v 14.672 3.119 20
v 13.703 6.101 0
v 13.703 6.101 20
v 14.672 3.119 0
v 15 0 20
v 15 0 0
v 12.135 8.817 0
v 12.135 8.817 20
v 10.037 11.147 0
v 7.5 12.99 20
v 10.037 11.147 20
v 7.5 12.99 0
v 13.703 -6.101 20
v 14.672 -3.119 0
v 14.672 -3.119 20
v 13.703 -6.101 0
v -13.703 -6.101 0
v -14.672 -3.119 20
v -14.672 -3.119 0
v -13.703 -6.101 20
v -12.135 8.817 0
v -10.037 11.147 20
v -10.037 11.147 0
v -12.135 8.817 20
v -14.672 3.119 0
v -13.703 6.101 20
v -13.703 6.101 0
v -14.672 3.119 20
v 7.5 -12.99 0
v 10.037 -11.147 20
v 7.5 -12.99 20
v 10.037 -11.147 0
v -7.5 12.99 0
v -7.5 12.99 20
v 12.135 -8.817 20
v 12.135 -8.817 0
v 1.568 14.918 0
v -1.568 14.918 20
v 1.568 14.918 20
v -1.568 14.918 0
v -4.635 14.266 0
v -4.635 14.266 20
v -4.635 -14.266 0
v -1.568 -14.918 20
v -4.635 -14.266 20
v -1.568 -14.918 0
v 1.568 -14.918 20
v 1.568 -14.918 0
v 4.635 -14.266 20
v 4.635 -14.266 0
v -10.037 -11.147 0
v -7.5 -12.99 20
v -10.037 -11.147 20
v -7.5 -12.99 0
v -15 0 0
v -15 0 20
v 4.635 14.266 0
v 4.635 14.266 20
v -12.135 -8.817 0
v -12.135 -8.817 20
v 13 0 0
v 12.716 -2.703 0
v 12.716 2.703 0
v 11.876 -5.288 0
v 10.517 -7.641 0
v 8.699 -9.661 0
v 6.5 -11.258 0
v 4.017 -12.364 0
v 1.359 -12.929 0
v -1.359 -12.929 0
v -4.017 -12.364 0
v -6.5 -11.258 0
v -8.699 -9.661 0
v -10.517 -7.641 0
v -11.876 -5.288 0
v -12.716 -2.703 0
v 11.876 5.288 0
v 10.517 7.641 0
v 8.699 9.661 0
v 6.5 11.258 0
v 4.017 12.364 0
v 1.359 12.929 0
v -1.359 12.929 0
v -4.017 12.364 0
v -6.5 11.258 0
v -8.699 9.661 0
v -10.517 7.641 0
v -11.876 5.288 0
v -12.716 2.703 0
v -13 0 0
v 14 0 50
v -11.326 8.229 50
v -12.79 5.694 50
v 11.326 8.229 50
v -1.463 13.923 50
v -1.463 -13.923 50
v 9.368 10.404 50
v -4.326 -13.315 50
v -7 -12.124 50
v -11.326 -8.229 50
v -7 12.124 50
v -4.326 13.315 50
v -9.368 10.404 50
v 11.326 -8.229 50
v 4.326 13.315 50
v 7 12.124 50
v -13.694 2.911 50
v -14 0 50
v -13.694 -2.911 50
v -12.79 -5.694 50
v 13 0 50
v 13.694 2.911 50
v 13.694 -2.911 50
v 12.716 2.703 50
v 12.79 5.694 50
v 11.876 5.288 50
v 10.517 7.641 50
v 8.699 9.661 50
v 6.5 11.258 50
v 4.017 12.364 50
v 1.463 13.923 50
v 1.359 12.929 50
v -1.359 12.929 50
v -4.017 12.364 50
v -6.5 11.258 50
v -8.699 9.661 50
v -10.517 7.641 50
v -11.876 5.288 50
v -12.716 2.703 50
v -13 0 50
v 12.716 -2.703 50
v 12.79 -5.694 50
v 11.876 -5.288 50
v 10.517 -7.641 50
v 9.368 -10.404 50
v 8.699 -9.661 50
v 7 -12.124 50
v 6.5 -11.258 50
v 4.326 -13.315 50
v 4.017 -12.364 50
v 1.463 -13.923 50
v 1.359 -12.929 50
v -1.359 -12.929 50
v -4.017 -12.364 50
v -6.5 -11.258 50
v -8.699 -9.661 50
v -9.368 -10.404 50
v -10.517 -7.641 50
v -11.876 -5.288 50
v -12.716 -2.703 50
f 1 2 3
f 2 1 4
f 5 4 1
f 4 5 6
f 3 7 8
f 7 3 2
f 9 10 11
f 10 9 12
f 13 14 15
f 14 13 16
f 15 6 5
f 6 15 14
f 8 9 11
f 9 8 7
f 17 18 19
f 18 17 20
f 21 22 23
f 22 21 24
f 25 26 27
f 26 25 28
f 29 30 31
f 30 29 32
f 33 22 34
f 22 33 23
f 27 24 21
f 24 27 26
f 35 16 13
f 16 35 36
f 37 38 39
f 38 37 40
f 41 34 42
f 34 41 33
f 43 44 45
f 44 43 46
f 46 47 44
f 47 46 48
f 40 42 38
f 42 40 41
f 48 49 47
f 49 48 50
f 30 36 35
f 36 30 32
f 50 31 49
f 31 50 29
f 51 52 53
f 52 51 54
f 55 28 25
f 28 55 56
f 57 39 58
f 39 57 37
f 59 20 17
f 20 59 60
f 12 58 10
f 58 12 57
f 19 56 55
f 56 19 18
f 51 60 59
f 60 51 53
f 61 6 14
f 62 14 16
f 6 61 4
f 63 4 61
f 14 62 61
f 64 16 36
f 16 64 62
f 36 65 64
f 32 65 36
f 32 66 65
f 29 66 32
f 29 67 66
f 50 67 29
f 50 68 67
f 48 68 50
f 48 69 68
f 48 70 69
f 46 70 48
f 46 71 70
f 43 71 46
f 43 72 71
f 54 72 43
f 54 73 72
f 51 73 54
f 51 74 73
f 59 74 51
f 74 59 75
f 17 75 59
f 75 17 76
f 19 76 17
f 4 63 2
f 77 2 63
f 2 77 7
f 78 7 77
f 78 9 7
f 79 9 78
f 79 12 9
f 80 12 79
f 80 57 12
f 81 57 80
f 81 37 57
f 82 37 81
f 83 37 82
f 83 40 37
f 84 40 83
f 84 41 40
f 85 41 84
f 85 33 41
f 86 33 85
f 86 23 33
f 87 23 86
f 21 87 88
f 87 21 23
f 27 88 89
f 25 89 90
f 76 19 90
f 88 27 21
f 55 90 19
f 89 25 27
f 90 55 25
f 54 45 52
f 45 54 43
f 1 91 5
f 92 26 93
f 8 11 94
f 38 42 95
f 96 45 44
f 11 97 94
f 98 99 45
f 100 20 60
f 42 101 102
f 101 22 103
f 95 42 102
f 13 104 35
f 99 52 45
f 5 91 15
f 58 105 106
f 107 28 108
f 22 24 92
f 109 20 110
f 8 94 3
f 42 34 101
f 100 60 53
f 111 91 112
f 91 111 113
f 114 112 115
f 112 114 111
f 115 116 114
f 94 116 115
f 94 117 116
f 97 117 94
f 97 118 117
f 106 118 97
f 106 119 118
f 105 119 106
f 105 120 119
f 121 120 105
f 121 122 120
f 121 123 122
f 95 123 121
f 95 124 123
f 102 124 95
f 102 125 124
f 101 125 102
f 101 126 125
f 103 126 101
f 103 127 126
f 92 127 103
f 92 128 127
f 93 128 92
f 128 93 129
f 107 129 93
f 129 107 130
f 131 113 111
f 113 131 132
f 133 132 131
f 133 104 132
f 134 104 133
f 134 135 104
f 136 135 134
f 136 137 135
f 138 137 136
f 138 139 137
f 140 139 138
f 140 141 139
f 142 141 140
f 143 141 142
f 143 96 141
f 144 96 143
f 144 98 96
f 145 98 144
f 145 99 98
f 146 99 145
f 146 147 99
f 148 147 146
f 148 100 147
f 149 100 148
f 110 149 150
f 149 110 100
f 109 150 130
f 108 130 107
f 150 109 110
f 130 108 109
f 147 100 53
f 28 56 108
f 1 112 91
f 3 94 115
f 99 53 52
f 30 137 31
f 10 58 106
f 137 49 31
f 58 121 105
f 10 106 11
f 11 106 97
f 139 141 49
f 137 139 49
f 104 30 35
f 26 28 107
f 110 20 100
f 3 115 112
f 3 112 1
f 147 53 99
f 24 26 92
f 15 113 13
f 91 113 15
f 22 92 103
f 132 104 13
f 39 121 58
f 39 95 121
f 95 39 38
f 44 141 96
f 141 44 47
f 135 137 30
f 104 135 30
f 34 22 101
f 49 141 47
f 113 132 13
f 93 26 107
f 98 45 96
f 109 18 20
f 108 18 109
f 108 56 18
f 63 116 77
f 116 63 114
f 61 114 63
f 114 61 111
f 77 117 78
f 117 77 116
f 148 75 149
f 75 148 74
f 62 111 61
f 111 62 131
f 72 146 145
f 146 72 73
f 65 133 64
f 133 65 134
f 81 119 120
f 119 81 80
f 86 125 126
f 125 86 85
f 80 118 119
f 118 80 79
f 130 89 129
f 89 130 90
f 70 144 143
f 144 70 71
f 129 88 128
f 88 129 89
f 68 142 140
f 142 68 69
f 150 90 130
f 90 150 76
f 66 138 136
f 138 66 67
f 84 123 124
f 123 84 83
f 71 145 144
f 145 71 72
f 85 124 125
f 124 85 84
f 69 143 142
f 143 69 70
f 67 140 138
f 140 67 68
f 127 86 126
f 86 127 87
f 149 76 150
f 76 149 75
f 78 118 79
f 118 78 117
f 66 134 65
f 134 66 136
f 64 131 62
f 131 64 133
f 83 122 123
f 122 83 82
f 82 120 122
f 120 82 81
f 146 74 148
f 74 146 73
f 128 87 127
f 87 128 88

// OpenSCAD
id_hose = 29;
od_port = 26;
T = 2;

difference() {
    union() {
        cylinder(20, od_port/2+T, od_port/2+T);
        translate([0,0,20]) cylinder(30, (id_hose+1)/2, (id_hose-1)/2);
    }
    cylinder(50, od_port/2, od_port/2);
}
